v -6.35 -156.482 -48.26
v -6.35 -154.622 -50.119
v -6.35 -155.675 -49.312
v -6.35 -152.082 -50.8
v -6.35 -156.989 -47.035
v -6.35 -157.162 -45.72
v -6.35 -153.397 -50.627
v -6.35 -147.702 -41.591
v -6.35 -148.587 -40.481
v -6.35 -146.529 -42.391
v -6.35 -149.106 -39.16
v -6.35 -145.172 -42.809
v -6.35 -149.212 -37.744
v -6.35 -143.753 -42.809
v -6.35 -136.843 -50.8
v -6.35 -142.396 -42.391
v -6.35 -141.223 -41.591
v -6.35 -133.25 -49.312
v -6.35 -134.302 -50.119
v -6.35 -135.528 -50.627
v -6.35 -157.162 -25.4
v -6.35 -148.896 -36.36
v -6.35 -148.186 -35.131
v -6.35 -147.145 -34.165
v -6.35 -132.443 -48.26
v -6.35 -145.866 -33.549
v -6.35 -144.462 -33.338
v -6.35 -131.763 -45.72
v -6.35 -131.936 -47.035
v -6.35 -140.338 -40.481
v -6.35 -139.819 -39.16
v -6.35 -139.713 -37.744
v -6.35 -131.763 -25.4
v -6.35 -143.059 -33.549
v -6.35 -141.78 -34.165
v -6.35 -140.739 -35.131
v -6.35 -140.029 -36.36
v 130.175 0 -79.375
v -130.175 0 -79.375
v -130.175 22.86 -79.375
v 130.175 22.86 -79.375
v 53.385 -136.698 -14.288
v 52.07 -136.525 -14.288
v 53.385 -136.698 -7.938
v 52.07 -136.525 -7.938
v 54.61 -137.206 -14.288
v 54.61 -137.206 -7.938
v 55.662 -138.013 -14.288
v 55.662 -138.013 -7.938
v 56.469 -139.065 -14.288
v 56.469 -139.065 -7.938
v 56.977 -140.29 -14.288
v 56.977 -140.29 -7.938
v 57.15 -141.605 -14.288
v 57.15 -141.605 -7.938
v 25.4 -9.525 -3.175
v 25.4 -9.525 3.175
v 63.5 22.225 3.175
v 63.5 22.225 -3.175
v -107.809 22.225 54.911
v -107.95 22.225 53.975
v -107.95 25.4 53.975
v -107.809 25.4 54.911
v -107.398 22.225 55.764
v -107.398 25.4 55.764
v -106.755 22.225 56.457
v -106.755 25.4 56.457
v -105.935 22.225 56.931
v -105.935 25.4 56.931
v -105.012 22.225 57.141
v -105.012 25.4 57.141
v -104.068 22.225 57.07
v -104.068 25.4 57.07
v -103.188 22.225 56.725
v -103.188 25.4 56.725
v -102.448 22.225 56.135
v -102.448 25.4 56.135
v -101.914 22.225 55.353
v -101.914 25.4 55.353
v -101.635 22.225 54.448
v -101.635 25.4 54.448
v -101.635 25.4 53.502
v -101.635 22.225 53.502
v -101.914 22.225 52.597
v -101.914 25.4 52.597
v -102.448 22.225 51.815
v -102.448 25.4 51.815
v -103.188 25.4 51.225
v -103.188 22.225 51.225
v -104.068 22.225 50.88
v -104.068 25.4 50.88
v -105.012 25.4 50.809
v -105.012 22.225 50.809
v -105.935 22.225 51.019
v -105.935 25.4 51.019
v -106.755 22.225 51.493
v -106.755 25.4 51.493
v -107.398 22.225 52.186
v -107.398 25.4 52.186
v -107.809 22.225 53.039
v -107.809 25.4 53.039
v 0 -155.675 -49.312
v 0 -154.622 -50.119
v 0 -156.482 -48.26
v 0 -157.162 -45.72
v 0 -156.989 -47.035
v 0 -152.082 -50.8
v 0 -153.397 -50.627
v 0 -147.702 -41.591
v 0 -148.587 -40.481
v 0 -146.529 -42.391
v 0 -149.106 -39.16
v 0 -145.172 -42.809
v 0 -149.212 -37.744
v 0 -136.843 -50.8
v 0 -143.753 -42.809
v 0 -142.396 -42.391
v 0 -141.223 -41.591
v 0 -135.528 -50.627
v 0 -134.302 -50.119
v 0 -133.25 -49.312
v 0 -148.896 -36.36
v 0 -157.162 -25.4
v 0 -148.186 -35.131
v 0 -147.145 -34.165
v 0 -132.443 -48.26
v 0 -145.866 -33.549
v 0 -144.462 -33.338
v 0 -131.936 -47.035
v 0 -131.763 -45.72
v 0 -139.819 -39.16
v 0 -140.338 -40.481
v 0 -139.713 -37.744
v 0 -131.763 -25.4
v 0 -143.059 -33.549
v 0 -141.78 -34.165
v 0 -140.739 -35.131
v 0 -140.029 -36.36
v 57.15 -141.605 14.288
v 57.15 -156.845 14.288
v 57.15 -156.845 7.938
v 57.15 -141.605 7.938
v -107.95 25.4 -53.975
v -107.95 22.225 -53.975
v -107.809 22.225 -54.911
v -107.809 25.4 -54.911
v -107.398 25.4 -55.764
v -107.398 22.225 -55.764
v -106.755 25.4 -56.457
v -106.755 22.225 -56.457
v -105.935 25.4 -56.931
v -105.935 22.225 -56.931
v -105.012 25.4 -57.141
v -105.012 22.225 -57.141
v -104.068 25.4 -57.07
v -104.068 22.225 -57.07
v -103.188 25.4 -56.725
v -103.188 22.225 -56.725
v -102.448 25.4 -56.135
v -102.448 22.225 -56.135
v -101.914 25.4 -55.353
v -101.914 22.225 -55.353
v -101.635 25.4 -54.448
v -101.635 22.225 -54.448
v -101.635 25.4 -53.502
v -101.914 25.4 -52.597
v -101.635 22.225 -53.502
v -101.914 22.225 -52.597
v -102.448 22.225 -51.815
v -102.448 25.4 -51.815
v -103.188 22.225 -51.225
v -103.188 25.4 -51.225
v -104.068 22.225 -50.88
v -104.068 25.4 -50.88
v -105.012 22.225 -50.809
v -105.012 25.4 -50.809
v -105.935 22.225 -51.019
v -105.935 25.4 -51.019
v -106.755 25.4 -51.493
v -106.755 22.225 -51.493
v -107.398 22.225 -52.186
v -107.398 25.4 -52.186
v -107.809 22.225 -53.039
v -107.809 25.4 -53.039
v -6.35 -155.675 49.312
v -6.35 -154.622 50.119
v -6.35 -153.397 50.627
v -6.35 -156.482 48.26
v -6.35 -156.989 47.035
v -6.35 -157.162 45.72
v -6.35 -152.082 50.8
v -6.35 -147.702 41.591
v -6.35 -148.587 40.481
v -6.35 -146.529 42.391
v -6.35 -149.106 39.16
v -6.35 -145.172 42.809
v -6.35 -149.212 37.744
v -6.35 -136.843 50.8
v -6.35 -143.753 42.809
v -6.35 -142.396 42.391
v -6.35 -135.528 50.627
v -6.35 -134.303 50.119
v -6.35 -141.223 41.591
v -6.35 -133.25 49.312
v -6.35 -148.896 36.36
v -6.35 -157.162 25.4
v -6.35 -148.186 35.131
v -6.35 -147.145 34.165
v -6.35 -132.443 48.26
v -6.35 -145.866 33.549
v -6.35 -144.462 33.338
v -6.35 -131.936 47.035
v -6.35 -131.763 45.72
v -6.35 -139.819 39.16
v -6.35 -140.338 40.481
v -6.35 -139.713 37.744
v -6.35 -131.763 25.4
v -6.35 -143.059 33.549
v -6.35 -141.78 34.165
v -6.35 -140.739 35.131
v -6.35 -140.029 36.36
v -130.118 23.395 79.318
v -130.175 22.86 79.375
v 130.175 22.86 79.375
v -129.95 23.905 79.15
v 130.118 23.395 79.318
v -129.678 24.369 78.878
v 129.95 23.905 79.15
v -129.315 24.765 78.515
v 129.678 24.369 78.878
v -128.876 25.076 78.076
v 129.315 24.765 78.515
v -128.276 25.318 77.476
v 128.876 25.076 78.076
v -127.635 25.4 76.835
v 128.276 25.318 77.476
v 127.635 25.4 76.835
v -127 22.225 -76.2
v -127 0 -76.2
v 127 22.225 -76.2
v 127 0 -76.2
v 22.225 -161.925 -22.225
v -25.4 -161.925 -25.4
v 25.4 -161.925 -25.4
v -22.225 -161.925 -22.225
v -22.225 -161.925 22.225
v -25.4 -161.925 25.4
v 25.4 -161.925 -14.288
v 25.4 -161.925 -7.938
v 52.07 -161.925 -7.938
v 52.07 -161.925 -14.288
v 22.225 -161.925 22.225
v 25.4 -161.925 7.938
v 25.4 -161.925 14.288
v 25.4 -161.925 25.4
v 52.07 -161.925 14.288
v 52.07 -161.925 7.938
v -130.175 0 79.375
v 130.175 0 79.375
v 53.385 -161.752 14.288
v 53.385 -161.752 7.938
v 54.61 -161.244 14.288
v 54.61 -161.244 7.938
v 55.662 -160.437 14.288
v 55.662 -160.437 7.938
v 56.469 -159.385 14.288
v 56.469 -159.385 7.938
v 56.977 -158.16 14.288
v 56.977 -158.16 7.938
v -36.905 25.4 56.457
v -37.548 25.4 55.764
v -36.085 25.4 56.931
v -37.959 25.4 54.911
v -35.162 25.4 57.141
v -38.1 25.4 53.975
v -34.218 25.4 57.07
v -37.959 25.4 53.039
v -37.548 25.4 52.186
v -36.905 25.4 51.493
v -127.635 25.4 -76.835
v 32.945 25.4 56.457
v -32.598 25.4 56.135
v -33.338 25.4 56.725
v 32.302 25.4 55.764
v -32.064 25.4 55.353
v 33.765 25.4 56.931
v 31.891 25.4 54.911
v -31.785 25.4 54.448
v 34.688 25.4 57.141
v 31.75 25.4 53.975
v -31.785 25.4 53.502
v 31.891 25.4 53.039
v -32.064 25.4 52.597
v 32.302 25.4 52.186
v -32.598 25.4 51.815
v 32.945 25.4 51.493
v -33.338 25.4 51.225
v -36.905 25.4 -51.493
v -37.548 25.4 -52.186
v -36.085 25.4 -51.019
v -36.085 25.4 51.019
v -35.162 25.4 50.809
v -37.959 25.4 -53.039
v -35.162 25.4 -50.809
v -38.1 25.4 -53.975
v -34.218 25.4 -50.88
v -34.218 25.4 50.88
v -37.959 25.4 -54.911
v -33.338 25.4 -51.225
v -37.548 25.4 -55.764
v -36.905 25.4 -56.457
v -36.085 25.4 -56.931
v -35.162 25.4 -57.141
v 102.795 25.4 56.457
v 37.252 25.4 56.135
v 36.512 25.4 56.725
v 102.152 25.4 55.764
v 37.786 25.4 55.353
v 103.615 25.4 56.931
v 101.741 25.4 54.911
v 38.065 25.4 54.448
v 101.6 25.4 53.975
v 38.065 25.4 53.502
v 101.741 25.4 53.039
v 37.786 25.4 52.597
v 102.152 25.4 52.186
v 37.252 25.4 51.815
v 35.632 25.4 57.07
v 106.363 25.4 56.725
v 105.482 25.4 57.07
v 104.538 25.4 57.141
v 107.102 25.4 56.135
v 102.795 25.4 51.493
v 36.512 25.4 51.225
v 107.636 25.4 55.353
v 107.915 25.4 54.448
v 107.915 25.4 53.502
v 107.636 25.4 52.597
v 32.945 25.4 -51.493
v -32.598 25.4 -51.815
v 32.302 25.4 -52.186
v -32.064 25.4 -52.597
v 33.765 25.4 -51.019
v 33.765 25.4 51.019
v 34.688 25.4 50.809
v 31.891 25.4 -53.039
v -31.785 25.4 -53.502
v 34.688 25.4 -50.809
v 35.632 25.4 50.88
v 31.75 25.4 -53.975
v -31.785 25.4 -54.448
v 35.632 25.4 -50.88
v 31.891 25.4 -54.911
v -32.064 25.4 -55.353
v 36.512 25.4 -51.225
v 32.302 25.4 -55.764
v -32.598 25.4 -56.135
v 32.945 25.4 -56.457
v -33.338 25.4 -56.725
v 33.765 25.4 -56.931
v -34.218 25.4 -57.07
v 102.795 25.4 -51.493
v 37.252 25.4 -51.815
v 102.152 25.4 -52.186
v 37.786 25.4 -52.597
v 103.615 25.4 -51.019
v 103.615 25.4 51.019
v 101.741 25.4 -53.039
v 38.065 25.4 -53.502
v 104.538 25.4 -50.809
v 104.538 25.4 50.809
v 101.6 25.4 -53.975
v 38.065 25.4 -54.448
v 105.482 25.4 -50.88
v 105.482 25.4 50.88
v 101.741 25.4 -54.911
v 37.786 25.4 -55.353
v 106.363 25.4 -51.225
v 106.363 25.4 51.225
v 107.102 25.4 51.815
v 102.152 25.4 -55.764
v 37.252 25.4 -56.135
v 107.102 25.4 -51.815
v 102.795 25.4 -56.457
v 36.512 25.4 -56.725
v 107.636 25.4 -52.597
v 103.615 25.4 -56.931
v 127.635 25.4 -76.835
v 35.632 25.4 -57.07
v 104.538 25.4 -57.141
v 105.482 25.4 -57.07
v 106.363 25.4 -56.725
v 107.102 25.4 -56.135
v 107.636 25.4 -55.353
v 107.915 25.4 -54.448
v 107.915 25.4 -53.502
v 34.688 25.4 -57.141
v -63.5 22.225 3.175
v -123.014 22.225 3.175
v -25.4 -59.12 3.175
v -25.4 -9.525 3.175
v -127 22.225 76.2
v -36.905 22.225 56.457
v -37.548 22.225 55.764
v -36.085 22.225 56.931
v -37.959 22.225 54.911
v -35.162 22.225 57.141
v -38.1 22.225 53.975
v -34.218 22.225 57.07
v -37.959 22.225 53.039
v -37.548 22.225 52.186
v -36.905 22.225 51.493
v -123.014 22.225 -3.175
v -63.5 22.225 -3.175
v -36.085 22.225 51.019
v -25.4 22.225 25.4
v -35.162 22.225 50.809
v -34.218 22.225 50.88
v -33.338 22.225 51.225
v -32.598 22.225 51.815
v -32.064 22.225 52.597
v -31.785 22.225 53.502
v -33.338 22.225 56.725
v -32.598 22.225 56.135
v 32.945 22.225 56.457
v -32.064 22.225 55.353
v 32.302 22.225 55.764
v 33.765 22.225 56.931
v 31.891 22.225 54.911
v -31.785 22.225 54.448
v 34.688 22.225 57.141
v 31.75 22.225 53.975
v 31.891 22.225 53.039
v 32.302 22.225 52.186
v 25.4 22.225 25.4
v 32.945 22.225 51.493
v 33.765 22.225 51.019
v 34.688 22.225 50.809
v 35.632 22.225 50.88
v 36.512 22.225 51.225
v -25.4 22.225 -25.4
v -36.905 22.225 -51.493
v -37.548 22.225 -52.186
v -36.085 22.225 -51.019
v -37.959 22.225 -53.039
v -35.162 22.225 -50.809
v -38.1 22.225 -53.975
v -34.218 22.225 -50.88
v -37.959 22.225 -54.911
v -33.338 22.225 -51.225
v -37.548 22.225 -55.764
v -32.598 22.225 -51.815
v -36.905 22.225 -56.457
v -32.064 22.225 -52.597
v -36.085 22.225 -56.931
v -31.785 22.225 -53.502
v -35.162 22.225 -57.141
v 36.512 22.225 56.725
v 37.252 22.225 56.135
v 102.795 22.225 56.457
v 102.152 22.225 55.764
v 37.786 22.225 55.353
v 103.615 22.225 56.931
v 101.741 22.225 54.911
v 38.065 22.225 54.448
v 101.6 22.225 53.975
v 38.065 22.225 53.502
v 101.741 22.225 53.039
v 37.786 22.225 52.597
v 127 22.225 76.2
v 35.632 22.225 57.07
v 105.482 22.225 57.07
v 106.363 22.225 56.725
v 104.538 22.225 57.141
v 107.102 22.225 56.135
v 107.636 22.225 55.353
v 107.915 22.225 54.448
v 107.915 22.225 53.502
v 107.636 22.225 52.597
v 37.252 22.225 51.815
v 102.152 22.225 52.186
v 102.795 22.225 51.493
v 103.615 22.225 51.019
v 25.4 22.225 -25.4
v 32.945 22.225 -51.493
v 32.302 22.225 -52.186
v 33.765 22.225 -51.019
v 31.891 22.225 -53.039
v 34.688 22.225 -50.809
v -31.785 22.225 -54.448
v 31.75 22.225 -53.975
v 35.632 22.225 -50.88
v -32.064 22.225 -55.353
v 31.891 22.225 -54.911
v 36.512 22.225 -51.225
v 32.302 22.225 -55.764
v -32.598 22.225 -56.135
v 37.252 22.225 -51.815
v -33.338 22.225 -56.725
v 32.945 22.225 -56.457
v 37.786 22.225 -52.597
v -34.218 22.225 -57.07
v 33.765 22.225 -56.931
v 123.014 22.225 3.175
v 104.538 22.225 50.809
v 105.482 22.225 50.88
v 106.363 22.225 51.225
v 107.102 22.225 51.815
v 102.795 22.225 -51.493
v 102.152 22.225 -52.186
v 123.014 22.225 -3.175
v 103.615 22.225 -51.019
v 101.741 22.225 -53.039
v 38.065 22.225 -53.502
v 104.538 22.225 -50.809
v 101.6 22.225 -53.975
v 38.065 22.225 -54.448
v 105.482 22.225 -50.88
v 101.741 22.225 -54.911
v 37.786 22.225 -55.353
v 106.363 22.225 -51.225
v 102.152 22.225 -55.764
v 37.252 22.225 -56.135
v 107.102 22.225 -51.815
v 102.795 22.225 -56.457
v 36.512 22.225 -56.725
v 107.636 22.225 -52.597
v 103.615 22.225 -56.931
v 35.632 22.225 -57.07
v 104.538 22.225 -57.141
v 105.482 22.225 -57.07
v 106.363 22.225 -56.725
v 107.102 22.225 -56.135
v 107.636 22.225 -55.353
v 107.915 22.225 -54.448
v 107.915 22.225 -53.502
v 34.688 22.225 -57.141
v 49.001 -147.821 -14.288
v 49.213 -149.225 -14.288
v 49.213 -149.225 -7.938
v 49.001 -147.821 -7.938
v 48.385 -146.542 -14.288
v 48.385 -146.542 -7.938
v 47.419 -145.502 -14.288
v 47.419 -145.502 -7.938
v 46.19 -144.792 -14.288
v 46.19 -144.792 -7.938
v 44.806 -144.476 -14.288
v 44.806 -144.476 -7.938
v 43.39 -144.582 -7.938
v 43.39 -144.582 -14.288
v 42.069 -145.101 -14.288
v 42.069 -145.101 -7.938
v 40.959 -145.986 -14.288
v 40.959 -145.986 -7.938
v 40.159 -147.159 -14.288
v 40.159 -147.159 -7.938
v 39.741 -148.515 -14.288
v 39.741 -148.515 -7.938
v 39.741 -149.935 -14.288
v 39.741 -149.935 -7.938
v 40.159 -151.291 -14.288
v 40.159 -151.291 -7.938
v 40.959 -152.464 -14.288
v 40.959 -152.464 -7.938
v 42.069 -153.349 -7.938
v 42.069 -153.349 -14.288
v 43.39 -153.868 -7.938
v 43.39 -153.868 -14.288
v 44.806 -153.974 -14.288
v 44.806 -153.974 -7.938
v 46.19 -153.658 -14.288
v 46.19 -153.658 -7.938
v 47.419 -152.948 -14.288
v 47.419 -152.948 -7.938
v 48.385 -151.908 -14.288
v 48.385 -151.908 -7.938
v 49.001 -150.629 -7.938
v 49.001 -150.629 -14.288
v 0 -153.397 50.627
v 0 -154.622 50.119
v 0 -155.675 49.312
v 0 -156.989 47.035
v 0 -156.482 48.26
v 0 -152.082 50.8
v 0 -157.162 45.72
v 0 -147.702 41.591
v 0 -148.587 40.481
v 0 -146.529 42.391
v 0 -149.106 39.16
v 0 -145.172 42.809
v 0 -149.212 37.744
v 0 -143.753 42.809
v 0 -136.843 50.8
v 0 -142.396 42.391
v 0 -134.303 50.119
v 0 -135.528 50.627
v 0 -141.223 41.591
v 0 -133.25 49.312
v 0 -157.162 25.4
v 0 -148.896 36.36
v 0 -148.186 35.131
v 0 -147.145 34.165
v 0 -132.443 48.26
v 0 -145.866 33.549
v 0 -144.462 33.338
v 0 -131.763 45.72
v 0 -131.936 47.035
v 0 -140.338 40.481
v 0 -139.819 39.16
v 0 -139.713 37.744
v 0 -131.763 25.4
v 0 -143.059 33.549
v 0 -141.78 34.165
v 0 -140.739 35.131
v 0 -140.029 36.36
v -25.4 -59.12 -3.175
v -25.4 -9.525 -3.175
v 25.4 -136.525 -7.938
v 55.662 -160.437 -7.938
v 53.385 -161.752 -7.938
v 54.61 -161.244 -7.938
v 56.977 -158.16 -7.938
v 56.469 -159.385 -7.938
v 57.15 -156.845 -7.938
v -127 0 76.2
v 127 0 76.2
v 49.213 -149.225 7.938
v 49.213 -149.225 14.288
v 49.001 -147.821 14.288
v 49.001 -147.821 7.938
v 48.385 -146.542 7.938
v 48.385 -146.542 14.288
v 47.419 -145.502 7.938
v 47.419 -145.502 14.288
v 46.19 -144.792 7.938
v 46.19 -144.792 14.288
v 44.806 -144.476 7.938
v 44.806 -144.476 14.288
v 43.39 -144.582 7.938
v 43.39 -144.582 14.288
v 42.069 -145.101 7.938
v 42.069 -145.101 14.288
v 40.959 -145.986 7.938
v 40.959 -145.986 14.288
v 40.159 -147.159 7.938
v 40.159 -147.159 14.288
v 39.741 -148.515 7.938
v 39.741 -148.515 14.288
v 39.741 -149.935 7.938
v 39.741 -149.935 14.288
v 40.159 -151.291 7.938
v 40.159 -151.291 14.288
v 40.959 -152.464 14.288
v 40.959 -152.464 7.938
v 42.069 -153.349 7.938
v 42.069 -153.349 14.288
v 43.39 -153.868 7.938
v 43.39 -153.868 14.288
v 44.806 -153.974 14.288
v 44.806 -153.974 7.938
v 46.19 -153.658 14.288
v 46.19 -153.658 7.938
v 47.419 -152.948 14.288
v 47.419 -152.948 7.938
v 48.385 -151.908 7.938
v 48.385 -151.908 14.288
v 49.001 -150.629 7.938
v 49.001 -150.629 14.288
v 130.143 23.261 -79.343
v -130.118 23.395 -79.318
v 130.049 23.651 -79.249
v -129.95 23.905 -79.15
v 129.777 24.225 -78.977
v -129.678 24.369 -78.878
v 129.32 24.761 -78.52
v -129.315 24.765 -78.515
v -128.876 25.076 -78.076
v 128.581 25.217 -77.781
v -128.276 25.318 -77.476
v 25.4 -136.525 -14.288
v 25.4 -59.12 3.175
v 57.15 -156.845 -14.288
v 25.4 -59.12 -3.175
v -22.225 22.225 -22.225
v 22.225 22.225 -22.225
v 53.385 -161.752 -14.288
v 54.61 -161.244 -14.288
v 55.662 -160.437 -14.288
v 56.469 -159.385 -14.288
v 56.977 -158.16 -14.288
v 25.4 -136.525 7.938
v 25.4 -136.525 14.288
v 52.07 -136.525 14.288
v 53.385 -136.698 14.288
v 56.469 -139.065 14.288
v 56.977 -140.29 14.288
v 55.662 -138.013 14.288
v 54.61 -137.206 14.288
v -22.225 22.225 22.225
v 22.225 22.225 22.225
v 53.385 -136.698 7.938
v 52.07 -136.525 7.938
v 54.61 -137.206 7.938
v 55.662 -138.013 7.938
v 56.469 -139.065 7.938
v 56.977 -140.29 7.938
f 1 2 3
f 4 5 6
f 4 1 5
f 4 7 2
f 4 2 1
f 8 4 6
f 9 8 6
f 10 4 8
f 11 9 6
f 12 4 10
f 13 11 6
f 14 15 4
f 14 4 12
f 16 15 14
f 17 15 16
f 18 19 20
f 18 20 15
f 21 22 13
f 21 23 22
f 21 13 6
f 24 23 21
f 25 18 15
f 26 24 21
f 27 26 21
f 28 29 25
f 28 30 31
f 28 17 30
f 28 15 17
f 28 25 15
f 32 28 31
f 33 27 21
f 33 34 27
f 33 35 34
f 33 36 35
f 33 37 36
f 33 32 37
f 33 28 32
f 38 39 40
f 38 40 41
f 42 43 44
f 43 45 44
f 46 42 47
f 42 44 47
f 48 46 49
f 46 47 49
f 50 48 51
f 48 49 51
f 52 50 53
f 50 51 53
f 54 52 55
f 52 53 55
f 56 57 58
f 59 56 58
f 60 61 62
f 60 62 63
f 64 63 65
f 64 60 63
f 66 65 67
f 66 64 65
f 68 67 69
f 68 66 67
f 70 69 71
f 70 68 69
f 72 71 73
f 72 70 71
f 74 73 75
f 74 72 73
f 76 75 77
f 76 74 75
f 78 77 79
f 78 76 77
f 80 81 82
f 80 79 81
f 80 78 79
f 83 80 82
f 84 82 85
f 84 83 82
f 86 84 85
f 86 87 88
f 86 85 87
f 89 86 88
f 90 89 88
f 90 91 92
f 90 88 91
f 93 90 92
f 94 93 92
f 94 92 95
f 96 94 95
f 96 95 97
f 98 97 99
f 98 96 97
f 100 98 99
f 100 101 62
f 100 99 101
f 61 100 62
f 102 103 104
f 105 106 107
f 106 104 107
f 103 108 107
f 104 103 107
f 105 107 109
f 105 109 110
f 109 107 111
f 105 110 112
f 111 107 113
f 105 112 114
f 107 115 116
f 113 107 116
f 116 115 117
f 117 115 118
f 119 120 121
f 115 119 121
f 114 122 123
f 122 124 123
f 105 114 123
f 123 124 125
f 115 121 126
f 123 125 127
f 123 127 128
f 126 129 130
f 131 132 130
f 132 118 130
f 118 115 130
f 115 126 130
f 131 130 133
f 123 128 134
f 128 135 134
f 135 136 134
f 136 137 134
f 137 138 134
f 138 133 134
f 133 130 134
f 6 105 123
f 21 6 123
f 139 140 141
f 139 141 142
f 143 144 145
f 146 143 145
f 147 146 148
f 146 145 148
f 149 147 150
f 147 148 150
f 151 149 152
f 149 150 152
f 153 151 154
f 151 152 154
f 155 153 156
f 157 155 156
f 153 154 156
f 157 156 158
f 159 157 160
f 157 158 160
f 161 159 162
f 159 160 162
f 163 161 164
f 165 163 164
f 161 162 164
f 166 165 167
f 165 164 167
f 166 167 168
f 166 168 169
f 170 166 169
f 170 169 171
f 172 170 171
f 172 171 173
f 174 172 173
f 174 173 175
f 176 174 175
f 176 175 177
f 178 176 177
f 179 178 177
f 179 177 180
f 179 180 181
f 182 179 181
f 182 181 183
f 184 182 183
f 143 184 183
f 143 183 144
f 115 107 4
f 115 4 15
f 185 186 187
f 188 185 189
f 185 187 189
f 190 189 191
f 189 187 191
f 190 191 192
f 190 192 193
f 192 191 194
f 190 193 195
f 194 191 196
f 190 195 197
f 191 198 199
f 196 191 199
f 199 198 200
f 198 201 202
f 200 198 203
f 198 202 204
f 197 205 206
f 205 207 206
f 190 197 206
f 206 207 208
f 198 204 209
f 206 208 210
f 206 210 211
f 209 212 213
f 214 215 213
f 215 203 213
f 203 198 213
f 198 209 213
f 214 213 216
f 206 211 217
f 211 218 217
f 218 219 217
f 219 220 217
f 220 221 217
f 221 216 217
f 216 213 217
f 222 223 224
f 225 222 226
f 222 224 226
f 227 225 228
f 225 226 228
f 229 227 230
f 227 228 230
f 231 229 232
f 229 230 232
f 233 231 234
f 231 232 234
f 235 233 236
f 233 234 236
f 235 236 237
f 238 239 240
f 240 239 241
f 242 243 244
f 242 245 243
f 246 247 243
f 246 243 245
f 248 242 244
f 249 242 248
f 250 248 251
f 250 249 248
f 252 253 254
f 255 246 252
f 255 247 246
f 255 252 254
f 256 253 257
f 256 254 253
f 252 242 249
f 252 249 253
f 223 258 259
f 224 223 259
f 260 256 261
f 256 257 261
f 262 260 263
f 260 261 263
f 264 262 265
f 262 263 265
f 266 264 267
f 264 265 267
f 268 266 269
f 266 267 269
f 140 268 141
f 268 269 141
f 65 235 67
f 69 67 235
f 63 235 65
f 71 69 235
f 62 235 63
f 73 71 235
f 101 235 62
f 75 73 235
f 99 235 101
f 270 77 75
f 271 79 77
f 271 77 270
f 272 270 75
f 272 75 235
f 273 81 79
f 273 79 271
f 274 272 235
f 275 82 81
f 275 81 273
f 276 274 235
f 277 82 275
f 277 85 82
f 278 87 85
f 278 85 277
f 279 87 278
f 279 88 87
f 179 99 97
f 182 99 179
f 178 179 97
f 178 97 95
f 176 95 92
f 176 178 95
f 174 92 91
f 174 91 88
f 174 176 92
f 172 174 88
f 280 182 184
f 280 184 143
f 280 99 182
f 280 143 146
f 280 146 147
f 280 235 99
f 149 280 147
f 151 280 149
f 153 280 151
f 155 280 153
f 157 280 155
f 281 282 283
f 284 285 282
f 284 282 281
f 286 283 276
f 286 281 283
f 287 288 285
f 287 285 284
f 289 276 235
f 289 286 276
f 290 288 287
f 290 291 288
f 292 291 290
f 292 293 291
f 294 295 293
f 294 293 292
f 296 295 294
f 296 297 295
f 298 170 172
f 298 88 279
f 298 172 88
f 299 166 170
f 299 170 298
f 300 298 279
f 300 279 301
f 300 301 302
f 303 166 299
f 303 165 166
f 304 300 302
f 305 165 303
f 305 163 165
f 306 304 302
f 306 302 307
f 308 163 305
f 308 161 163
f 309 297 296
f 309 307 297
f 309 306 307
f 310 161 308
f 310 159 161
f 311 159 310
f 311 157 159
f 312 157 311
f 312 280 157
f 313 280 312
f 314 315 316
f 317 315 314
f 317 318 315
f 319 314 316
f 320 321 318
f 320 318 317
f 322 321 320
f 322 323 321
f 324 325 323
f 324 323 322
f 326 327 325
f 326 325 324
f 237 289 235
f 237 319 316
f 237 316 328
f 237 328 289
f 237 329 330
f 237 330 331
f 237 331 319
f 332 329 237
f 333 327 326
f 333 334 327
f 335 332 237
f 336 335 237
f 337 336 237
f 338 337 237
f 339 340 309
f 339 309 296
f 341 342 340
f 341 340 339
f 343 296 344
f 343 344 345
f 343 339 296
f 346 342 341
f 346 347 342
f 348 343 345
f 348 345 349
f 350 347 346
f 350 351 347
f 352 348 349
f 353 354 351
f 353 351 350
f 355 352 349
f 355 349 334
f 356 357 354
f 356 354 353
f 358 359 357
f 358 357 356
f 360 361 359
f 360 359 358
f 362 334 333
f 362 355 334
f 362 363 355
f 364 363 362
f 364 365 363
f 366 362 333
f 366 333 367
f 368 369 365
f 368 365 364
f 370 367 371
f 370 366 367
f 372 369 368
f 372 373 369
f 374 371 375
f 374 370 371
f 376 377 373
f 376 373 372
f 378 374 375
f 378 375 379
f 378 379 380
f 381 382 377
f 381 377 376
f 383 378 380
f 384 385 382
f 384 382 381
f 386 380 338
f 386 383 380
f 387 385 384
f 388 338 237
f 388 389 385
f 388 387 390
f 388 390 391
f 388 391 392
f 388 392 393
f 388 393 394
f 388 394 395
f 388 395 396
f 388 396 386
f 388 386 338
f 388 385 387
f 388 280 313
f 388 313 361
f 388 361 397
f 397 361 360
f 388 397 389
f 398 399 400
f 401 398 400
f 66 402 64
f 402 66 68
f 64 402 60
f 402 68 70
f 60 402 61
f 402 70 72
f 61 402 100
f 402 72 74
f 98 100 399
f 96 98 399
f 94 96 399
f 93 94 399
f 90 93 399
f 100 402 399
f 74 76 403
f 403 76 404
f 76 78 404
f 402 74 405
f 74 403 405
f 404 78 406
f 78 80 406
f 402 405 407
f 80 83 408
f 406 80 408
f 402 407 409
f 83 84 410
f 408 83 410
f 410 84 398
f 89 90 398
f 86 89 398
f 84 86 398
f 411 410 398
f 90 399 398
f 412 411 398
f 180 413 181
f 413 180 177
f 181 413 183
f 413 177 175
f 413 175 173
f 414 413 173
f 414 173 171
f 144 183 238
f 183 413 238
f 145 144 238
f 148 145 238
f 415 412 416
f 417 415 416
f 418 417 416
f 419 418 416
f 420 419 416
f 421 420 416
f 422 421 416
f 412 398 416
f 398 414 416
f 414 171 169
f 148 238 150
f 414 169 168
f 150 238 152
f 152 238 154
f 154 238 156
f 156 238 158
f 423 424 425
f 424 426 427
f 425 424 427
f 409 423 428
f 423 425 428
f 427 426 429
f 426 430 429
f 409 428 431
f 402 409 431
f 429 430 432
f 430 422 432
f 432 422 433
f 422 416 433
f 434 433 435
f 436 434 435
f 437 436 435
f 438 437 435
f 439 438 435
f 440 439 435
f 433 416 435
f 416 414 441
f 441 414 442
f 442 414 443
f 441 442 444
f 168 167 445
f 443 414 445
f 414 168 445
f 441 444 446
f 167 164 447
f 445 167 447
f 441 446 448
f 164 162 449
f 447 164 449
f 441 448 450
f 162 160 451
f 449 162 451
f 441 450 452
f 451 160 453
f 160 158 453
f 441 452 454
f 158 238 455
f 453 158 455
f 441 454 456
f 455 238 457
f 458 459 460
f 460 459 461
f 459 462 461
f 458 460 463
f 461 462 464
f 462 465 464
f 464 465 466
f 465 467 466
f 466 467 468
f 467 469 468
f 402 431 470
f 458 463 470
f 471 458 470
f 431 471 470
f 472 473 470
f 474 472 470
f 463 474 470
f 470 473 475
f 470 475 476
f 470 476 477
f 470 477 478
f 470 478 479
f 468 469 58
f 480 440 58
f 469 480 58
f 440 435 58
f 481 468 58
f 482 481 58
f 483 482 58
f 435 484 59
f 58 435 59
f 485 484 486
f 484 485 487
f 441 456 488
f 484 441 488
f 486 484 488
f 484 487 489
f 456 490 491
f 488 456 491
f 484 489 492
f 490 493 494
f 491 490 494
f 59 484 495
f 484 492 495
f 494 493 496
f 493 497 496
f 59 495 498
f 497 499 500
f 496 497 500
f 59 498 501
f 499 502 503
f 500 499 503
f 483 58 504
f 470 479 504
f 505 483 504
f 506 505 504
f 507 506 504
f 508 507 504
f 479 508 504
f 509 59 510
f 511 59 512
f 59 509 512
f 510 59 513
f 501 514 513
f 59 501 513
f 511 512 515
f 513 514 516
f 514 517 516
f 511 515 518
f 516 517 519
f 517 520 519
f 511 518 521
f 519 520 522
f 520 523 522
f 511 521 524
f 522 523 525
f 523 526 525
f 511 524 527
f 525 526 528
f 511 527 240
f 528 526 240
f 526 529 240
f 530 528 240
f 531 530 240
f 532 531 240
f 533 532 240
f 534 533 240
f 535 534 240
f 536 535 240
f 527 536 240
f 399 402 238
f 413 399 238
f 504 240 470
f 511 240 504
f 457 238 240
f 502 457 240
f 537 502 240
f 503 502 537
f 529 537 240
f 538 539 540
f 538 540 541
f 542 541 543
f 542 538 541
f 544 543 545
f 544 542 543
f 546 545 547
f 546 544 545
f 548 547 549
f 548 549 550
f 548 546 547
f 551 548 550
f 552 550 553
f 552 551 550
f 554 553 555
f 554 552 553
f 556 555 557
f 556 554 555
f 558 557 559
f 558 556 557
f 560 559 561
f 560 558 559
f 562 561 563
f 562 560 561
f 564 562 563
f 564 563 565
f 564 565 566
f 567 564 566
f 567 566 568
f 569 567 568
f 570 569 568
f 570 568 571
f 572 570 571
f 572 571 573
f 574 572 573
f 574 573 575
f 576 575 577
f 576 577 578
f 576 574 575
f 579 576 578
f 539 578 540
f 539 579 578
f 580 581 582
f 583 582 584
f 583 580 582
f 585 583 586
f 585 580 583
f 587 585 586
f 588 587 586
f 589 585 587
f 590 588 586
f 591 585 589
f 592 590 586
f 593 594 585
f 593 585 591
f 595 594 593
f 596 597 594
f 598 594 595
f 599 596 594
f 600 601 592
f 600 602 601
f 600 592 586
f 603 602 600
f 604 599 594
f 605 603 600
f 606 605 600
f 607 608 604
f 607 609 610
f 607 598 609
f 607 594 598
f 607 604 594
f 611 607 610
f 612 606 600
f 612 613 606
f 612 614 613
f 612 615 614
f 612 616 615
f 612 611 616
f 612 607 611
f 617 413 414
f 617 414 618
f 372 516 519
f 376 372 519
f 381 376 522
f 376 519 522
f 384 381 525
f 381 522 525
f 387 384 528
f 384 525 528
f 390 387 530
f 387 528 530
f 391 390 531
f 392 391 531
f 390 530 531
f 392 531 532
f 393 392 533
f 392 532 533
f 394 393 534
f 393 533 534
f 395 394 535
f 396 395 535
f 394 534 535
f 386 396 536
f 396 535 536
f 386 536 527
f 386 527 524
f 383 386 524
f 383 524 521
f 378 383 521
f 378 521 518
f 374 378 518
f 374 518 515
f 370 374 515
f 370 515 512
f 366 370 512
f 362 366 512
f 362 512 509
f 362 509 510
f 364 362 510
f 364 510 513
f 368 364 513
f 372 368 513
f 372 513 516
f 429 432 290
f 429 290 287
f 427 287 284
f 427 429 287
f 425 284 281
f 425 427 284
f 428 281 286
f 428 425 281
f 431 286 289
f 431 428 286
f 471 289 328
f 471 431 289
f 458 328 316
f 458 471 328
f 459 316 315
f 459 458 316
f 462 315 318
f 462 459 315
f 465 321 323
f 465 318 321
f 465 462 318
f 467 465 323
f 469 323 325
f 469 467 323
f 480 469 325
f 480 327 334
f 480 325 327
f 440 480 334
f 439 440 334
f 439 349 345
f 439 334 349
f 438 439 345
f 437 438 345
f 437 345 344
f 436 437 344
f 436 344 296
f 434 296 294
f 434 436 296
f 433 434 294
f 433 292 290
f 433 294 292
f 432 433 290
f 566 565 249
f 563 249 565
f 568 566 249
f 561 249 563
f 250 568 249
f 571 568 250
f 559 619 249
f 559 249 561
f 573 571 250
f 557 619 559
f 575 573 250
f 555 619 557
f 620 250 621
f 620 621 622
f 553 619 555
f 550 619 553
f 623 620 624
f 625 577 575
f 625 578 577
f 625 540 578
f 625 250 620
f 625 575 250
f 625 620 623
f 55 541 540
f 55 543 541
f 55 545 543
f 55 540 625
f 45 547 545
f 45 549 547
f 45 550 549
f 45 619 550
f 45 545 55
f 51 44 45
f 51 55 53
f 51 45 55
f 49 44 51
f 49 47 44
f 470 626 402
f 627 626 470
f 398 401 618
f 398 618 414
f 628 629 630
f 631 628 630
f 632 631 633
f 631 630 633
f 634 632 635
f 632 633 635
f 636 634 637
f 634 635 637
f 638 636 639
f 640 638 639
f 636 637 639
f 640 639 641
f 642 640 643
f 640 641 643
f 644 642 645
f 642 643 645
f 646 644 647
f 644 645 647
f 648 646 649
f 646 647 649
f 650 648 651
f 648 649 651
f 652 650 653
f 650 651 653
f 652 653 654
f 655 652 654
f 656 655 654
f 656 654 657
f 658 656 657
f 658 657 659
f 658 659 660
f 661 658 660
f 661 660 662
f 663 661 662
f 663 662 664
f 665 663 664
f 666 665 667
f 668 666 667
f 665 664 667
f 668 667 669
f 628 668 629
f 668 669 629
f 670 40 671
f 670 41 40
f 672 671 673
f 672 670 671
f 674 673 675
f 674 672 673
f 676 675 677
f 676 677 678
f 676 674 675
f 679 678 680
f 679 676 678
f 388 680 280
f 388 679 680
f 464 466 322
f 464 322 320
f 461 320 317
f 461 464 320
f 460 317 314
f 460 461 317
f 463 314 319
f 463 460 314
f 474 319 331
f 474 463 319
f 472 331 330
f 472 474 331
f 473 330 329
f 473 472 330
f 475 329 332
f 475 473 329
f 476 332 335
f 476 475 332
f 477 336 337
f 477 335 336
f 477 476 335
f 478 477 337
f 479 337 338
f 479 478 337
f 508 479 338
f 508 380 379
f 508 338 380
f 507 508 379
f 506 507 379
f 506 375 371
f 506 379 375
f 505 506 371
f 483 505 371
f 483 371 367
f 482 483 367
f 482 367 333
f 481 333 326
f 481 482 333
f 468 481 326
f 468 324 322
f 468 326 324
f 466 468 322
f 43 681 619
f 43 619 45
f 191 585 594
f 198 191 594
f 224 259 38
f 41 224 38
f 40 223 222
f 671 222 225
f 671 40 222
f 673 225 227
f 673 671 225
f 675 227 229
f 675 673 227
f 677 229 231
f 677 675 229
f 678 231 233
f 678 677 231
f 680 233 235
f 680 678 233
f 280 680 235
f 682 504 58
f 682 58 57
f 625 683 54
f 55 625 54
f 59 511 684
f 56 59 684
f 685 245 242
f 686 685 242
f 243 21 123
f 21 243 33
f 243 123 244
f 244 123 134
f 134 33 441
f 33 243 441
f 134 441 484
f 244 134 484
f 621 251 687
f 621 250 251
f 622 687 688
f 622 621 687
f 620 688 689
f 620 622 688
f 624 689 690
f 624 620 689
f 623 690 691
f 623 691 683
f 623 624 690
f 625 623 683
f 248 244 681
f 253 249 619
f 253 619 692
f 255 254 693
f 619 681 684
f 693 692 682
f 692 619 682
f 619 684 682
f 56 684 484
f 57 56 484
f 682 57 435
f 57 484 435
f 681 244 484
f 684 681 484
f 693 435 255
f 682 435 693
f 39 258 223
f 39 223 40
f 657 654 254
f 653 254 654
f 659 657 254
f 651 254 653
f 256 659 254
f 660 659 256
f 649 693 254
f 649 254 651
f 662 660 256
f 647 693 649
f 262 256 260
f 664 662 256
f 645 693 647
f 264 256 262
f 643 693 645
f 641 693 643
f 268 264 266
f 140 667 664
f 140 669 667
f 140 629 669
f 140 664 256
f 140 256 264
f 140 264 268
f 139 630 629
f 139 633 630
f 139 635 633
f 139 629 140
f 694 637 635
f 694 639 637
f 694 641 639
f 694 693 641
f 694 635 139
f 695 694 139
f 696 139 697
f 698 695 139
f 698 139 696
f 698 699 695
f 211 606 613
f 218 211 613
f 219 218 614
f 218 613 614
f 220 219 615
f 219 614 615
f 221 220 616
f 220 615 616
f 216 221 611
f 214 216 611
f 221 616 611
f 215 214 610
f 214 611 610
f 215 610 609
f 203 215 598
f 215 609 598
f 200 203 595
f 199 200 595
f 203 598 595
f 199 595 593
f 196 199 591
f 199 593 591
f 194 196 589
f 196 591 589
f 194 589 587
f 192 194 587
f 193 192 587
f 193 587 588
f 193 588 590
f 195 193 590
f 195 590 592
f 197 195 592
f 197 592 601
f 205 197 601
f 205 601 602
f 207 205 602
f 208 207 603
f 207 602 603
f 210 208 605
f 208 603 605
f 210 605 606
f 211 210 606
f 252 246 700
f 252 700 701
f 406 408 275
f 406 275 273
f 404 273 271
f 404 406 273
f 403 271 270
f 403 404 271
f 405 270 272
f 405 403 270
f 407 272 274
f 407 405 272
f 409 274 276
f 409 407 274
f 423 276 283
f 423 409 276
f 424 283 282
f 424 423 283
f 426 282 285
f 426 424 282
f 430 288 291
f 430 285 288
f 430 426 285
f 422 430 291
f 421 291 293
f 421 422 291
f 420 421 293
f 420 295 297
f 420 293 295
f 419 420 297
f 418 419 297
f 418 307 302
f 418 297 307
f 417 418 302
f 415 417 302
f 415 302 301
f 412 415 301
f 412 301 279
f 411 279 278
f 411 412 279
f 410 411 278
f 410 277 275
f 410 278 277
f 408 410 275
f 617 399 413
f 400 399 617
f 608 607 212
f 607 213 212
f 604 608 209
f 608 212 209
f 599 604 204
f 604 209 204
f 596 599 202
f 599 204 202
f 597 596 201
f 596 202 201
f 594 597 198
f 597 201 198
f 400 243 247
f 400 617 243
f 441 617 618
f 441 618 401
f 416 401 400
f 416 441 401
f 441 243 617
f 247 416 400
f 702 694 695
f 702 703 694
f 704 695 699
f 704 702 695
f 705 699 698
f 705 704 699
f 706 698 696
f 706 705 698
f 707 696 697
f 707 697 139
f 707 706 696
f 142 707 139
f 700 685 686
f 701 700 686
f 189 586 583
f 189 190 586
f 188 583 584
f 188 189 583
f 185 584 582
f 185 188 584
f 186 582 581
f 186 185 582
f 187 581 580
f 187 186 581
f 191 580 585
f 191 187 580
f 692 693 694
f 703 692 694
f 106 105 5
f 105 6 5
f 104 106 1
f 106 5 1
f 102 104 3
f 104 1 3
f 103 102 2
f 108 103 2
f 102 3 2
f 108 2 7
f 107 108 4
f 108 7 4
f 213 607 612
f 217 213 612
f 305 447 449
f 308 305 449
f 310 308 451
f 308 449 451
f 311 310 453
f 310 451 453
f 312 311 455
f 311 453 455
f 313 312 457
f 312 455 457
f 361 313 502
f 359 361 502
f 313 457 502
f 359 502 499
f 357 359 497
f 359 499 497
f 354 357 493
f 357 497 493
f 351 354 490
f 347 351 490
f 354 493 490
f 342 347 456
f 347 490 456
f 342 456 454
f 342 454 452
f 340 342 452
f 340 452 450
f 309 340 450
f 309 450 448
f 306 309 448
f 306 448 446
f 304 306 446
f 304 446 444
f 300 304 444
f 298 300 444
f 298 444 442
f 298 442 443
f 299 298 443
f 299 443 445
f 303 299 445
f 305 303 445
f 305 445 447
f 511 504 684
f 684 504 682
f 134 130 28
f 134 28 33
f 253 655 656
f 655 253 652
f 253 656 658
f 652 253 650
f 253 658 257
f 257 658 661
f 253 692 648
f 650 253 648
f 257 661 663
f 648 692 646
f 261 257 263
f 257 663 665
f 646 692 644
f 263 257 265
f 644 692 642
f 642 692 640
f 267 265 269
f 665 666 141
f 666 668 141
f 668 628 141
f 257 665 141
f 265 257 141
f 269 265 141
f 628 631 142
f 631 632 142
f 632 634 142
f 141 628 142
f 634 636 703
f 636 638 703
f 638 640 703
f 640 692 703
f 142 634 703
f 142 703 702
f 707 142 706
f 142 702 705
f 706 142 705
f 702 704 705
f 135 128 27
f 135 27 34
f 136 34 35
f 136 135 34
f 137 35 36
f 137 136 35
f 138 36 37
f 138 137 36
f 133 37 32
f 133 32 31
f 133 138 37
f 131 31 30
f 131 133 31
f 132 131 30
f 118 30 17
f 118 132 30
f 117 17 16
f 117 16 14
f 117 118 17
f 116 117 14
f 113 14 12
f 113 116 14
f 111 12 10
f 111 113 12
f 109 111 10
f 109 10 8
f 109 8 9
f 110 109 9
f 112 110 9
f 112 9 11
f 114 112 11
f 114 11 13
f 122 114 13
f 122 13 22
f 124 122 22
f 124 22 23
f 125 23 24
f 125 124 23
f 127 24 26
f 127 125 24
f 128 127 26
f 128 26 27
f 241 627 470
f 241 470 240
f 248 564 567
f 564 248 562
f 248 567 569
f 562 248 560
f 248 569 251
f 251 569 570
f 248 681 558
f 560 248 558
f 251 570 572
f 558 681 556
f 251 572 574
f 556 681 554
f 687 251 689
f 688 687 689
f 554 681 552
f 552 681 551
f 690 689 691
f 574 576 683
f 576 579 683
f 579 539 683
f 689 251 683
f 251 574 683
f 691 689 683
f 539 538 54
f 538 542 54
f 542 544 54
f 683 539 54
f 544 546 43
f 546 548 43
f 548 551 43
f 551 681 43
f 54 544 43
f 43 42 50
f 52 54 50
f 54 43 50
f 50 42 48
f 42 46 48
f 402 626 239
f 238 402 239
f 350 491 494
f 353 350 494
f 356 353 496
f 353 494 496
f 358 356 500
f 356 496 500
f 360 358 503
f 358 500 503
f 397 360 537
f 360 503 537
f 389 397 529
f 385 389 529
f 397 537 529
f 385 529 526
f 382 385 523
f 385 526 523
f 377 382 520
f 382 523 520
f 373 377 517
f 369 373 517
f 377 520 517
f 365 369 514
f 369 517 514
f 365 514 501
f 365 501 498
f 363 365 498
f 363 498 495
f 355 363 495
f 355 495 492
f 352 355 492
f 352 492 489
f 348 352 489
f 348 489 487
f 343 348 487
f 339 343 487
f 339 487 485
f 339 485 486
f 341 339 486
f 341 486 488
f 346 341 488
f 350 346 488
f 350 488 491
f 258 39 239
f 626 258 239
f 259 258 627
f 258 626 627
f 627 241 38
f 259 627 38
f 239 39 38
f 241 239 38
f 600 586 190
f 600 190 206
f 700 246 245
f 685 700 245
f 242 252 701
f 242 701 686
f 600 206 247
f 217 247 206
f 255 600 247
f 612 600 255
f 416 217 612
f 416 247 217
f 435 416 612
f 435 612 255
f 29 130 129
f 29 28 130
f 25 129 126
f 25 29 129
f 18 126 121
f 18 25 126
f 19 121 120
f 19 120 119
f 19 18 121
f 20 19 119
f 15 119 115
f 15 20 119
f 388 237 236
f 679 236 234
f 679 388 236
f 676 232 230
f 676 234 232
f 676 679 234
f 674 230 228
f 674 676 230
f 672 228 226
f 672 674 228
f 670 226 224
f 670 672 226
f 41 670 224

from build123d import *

# Parameters (mm, degrees)
SKETCH1_W                   = 260.35
SKETCH1_H                   = 158.75
BOSS_EXTRUDE1_DEPTH         = 25.4
SHELL1_T                    = -3.175
SKETCH2_W                   = 50.8
SKETCH2_H                   = 50.8
BOSS_EXTRUDE2_DEPTH         = 184.15
SHELL2_START                = -161.925
SHELL2_OUTLINE_W            = 44.45
SHELL2_OUTLINE_H            = 44.45
SHELL2_DEPTH                = 184.15
BOSS_EXTRUDE3_DEPTH         = 3.175
FILLET1_R                   = 2.54
SKETCH6_W                   = 31.75
SKETCH6_H                   = 25.4
SKETCH6_R                   = 4.7625
BOSS_EXTRUDE4_DEPTH         = 6.35
FILLET2_R                   = 5.08
SKETCH7_W                   = 25.4
SKETCH7_H                   = 25.4
SKETCH7_R                   = 4.7625
BOSS_EXTRUDE5_DEPTH         = 6.35
FILLET3_R                   = 5.08
FILLET3_OF_MIRROR3_R        = 5.08
F_1_4_0_25_DIAMETER_HOLE1_D = 6.35


# Read off the part's stored shape, not the designer's step: Shell2
with BuildPart() as part:
    # Sketch1 → Boss-Extrude1 (new body)
    with BuildSketch(Plane(origin=(0, 0, 0), x_dir=(1, 0, 0), z_dir=(0, 1, 0))):
        Rectangle(SKETCH1_W, SKETCH1_H)
    extrude(amount=BOSS_EXTRUDE1_DEPTH)

    # Shell1
    shell1_openings = [part.faces().sort_by_distance(p)[0] for p in [
        (0, 0, 0),
    ]]
    offset(amount=SHELL1_T, openings=shell1_openings, kind=Kind.INTERSECTION)

    # Sketch2 → Boss-Extrude2 (add)
    with BuildSketch(Plane.XZ.offset(-22.225)):
        Rectangle(SKETCH2_W, SKETCH2_H)
    extrude(amount=BOSS_EXTRUDE2_DEPTH)

    # Shell2 outline → Shell2 (cut)
    with BuildSketch(Plane(origin=(0, 0, 0), x_dir=(1, 0, 0), z_dir=(0, 1, 0)).offset(SHELL2_START)):
        Rectangle(SHELL2_OUTLINE_W, SHELL2_OUTLINE_H)
    extrude(amount=SHELL2_DEPTH, mode=Mode.SUBTRACT)

    # Sketch4 → Boss-Extrude3 (add, symmetric)
    with BuildSketch(Plane.XY):
        Polygon((25.4, -9.525), (63.5, 22.225), (123.01410253, 22.225), (25.4, -59.120085442), align=None)
    boss_extrude3 = extrude(amount=BOSS_EXTRUDE3_DEPTH, both=True)

    # Mirror1: Boss-Extrude3 across plane
    add(boss_extrude3.mirror(Plane(origin=(0, 0, 0), x_dir=(0, 0, 1), z_dir=(1, 0, 0))))

    # Fillet1
    fillet1_edges = [part.edges().sort_by_distance(p)[0] for p in [
        (-130.175, 25.4, 0),
        (0, 25.4, 79.375),
        (130.175, 25.4, 0),
        (0, 25.4, -79.375),
    ]]
    fillet(fillet1_edges, radius=FILLET1_R)

    # Sketch6 → Boss-Extrude4 (add)
    with BuildSketch(Plane.XY.offset(14.2875)):
        with Locations((41.275, -149.225)):
            Rectangle(SKETCH6_W, SKETCH6_H)
        with Locations((44.45, -149.225)):
            Circle(SKETCH6_R, mode=Mode.SUBTRACT)
    boss_extrude4 = extrude(amount=-BOSS_EXTRUDE4_DEPTH)

    # Mirror2: Boss-Extrude4 across plane
    add(boss_extrude4.mirror(Plane.XY))

    # Fillet2
    fillet2_edges = [part.edges().sort_by_distance(p)[0] for p in [
        (57.15, -161.925, -11.1125),
        (57.15, -136.525, -11.1125),
        (57.15, -136.525, 11.1125),
        (57.15, -161.925, 11.1125),
    ]]
    fillet(fillet2_edges, radius=FILLET2_R)

    # Sketch7 → Boss-Extrude5 (add)
    with BuildSketch(Plane(origin=(0, 0, 0), x_dir=(0, 0, -1), z_dir=(1, 0, 0))):
        with Locations((-38.1, -144.4625)):
            Rectangle(SKETCH7_W, SKETCH7_H)
        with Locations((-38.1, -144.4625)):
            Circle(SKETCH7_R, mode=Mode.SUBTRACT)
    boss_extrude5 = extrude(amount=-BOSS_EXTRUDE5_DEPTH)

    # Fillet3
    fillet3_edges = [part.edges().sort_by_distance(p)[0] for p in [
        (-3.175, -157.1625, 50.8),
        (-3.175, -131.7625, 50.8),
    ]]
    fillet(fillet3_edges, radius=FILLET3_R)

    # Mirror3: Boss-Extrude5 across plane
    add(boss_extrude5.mirror(Plane.XY))

    # Fillet3 of Mirror3
    fillet3_of_mirror3_edges = [part.edges().sort_by_distance(p)[0] for p in [
        (-3.175, -157.1625, -50.8),
        (-3.175, -131.7625, -50.8),
    ]]
    fillet(fillet3_of_mirror3_edges, radius=FILLET3_OF_MIRROR3_R)

    # 1/4 (0.25) Diameter Hole1 (through all)
    with Locations(Plane(origin=(0, 25.4, 0), x_dir=(1, 0, 0), z_dir=(0, 1, 0))):
        with Locations((-104.775, 53.975), (-34.925, 53.975), (34.925, 53.975), (104.775, 53.975)):
            f_1_4_0_25_diameter_hole1 = Hole(F_1_4_0_25_DIAMETER_HOLE1_D / 2)

    # Mirror4: 1/4 (0.25) Diameter Hole1 across plane
    add(f_1_4_0_25_diameter_hole1.mirror(Plane.XY), mode=Mode.SUBTRACT)


solid = part.part
